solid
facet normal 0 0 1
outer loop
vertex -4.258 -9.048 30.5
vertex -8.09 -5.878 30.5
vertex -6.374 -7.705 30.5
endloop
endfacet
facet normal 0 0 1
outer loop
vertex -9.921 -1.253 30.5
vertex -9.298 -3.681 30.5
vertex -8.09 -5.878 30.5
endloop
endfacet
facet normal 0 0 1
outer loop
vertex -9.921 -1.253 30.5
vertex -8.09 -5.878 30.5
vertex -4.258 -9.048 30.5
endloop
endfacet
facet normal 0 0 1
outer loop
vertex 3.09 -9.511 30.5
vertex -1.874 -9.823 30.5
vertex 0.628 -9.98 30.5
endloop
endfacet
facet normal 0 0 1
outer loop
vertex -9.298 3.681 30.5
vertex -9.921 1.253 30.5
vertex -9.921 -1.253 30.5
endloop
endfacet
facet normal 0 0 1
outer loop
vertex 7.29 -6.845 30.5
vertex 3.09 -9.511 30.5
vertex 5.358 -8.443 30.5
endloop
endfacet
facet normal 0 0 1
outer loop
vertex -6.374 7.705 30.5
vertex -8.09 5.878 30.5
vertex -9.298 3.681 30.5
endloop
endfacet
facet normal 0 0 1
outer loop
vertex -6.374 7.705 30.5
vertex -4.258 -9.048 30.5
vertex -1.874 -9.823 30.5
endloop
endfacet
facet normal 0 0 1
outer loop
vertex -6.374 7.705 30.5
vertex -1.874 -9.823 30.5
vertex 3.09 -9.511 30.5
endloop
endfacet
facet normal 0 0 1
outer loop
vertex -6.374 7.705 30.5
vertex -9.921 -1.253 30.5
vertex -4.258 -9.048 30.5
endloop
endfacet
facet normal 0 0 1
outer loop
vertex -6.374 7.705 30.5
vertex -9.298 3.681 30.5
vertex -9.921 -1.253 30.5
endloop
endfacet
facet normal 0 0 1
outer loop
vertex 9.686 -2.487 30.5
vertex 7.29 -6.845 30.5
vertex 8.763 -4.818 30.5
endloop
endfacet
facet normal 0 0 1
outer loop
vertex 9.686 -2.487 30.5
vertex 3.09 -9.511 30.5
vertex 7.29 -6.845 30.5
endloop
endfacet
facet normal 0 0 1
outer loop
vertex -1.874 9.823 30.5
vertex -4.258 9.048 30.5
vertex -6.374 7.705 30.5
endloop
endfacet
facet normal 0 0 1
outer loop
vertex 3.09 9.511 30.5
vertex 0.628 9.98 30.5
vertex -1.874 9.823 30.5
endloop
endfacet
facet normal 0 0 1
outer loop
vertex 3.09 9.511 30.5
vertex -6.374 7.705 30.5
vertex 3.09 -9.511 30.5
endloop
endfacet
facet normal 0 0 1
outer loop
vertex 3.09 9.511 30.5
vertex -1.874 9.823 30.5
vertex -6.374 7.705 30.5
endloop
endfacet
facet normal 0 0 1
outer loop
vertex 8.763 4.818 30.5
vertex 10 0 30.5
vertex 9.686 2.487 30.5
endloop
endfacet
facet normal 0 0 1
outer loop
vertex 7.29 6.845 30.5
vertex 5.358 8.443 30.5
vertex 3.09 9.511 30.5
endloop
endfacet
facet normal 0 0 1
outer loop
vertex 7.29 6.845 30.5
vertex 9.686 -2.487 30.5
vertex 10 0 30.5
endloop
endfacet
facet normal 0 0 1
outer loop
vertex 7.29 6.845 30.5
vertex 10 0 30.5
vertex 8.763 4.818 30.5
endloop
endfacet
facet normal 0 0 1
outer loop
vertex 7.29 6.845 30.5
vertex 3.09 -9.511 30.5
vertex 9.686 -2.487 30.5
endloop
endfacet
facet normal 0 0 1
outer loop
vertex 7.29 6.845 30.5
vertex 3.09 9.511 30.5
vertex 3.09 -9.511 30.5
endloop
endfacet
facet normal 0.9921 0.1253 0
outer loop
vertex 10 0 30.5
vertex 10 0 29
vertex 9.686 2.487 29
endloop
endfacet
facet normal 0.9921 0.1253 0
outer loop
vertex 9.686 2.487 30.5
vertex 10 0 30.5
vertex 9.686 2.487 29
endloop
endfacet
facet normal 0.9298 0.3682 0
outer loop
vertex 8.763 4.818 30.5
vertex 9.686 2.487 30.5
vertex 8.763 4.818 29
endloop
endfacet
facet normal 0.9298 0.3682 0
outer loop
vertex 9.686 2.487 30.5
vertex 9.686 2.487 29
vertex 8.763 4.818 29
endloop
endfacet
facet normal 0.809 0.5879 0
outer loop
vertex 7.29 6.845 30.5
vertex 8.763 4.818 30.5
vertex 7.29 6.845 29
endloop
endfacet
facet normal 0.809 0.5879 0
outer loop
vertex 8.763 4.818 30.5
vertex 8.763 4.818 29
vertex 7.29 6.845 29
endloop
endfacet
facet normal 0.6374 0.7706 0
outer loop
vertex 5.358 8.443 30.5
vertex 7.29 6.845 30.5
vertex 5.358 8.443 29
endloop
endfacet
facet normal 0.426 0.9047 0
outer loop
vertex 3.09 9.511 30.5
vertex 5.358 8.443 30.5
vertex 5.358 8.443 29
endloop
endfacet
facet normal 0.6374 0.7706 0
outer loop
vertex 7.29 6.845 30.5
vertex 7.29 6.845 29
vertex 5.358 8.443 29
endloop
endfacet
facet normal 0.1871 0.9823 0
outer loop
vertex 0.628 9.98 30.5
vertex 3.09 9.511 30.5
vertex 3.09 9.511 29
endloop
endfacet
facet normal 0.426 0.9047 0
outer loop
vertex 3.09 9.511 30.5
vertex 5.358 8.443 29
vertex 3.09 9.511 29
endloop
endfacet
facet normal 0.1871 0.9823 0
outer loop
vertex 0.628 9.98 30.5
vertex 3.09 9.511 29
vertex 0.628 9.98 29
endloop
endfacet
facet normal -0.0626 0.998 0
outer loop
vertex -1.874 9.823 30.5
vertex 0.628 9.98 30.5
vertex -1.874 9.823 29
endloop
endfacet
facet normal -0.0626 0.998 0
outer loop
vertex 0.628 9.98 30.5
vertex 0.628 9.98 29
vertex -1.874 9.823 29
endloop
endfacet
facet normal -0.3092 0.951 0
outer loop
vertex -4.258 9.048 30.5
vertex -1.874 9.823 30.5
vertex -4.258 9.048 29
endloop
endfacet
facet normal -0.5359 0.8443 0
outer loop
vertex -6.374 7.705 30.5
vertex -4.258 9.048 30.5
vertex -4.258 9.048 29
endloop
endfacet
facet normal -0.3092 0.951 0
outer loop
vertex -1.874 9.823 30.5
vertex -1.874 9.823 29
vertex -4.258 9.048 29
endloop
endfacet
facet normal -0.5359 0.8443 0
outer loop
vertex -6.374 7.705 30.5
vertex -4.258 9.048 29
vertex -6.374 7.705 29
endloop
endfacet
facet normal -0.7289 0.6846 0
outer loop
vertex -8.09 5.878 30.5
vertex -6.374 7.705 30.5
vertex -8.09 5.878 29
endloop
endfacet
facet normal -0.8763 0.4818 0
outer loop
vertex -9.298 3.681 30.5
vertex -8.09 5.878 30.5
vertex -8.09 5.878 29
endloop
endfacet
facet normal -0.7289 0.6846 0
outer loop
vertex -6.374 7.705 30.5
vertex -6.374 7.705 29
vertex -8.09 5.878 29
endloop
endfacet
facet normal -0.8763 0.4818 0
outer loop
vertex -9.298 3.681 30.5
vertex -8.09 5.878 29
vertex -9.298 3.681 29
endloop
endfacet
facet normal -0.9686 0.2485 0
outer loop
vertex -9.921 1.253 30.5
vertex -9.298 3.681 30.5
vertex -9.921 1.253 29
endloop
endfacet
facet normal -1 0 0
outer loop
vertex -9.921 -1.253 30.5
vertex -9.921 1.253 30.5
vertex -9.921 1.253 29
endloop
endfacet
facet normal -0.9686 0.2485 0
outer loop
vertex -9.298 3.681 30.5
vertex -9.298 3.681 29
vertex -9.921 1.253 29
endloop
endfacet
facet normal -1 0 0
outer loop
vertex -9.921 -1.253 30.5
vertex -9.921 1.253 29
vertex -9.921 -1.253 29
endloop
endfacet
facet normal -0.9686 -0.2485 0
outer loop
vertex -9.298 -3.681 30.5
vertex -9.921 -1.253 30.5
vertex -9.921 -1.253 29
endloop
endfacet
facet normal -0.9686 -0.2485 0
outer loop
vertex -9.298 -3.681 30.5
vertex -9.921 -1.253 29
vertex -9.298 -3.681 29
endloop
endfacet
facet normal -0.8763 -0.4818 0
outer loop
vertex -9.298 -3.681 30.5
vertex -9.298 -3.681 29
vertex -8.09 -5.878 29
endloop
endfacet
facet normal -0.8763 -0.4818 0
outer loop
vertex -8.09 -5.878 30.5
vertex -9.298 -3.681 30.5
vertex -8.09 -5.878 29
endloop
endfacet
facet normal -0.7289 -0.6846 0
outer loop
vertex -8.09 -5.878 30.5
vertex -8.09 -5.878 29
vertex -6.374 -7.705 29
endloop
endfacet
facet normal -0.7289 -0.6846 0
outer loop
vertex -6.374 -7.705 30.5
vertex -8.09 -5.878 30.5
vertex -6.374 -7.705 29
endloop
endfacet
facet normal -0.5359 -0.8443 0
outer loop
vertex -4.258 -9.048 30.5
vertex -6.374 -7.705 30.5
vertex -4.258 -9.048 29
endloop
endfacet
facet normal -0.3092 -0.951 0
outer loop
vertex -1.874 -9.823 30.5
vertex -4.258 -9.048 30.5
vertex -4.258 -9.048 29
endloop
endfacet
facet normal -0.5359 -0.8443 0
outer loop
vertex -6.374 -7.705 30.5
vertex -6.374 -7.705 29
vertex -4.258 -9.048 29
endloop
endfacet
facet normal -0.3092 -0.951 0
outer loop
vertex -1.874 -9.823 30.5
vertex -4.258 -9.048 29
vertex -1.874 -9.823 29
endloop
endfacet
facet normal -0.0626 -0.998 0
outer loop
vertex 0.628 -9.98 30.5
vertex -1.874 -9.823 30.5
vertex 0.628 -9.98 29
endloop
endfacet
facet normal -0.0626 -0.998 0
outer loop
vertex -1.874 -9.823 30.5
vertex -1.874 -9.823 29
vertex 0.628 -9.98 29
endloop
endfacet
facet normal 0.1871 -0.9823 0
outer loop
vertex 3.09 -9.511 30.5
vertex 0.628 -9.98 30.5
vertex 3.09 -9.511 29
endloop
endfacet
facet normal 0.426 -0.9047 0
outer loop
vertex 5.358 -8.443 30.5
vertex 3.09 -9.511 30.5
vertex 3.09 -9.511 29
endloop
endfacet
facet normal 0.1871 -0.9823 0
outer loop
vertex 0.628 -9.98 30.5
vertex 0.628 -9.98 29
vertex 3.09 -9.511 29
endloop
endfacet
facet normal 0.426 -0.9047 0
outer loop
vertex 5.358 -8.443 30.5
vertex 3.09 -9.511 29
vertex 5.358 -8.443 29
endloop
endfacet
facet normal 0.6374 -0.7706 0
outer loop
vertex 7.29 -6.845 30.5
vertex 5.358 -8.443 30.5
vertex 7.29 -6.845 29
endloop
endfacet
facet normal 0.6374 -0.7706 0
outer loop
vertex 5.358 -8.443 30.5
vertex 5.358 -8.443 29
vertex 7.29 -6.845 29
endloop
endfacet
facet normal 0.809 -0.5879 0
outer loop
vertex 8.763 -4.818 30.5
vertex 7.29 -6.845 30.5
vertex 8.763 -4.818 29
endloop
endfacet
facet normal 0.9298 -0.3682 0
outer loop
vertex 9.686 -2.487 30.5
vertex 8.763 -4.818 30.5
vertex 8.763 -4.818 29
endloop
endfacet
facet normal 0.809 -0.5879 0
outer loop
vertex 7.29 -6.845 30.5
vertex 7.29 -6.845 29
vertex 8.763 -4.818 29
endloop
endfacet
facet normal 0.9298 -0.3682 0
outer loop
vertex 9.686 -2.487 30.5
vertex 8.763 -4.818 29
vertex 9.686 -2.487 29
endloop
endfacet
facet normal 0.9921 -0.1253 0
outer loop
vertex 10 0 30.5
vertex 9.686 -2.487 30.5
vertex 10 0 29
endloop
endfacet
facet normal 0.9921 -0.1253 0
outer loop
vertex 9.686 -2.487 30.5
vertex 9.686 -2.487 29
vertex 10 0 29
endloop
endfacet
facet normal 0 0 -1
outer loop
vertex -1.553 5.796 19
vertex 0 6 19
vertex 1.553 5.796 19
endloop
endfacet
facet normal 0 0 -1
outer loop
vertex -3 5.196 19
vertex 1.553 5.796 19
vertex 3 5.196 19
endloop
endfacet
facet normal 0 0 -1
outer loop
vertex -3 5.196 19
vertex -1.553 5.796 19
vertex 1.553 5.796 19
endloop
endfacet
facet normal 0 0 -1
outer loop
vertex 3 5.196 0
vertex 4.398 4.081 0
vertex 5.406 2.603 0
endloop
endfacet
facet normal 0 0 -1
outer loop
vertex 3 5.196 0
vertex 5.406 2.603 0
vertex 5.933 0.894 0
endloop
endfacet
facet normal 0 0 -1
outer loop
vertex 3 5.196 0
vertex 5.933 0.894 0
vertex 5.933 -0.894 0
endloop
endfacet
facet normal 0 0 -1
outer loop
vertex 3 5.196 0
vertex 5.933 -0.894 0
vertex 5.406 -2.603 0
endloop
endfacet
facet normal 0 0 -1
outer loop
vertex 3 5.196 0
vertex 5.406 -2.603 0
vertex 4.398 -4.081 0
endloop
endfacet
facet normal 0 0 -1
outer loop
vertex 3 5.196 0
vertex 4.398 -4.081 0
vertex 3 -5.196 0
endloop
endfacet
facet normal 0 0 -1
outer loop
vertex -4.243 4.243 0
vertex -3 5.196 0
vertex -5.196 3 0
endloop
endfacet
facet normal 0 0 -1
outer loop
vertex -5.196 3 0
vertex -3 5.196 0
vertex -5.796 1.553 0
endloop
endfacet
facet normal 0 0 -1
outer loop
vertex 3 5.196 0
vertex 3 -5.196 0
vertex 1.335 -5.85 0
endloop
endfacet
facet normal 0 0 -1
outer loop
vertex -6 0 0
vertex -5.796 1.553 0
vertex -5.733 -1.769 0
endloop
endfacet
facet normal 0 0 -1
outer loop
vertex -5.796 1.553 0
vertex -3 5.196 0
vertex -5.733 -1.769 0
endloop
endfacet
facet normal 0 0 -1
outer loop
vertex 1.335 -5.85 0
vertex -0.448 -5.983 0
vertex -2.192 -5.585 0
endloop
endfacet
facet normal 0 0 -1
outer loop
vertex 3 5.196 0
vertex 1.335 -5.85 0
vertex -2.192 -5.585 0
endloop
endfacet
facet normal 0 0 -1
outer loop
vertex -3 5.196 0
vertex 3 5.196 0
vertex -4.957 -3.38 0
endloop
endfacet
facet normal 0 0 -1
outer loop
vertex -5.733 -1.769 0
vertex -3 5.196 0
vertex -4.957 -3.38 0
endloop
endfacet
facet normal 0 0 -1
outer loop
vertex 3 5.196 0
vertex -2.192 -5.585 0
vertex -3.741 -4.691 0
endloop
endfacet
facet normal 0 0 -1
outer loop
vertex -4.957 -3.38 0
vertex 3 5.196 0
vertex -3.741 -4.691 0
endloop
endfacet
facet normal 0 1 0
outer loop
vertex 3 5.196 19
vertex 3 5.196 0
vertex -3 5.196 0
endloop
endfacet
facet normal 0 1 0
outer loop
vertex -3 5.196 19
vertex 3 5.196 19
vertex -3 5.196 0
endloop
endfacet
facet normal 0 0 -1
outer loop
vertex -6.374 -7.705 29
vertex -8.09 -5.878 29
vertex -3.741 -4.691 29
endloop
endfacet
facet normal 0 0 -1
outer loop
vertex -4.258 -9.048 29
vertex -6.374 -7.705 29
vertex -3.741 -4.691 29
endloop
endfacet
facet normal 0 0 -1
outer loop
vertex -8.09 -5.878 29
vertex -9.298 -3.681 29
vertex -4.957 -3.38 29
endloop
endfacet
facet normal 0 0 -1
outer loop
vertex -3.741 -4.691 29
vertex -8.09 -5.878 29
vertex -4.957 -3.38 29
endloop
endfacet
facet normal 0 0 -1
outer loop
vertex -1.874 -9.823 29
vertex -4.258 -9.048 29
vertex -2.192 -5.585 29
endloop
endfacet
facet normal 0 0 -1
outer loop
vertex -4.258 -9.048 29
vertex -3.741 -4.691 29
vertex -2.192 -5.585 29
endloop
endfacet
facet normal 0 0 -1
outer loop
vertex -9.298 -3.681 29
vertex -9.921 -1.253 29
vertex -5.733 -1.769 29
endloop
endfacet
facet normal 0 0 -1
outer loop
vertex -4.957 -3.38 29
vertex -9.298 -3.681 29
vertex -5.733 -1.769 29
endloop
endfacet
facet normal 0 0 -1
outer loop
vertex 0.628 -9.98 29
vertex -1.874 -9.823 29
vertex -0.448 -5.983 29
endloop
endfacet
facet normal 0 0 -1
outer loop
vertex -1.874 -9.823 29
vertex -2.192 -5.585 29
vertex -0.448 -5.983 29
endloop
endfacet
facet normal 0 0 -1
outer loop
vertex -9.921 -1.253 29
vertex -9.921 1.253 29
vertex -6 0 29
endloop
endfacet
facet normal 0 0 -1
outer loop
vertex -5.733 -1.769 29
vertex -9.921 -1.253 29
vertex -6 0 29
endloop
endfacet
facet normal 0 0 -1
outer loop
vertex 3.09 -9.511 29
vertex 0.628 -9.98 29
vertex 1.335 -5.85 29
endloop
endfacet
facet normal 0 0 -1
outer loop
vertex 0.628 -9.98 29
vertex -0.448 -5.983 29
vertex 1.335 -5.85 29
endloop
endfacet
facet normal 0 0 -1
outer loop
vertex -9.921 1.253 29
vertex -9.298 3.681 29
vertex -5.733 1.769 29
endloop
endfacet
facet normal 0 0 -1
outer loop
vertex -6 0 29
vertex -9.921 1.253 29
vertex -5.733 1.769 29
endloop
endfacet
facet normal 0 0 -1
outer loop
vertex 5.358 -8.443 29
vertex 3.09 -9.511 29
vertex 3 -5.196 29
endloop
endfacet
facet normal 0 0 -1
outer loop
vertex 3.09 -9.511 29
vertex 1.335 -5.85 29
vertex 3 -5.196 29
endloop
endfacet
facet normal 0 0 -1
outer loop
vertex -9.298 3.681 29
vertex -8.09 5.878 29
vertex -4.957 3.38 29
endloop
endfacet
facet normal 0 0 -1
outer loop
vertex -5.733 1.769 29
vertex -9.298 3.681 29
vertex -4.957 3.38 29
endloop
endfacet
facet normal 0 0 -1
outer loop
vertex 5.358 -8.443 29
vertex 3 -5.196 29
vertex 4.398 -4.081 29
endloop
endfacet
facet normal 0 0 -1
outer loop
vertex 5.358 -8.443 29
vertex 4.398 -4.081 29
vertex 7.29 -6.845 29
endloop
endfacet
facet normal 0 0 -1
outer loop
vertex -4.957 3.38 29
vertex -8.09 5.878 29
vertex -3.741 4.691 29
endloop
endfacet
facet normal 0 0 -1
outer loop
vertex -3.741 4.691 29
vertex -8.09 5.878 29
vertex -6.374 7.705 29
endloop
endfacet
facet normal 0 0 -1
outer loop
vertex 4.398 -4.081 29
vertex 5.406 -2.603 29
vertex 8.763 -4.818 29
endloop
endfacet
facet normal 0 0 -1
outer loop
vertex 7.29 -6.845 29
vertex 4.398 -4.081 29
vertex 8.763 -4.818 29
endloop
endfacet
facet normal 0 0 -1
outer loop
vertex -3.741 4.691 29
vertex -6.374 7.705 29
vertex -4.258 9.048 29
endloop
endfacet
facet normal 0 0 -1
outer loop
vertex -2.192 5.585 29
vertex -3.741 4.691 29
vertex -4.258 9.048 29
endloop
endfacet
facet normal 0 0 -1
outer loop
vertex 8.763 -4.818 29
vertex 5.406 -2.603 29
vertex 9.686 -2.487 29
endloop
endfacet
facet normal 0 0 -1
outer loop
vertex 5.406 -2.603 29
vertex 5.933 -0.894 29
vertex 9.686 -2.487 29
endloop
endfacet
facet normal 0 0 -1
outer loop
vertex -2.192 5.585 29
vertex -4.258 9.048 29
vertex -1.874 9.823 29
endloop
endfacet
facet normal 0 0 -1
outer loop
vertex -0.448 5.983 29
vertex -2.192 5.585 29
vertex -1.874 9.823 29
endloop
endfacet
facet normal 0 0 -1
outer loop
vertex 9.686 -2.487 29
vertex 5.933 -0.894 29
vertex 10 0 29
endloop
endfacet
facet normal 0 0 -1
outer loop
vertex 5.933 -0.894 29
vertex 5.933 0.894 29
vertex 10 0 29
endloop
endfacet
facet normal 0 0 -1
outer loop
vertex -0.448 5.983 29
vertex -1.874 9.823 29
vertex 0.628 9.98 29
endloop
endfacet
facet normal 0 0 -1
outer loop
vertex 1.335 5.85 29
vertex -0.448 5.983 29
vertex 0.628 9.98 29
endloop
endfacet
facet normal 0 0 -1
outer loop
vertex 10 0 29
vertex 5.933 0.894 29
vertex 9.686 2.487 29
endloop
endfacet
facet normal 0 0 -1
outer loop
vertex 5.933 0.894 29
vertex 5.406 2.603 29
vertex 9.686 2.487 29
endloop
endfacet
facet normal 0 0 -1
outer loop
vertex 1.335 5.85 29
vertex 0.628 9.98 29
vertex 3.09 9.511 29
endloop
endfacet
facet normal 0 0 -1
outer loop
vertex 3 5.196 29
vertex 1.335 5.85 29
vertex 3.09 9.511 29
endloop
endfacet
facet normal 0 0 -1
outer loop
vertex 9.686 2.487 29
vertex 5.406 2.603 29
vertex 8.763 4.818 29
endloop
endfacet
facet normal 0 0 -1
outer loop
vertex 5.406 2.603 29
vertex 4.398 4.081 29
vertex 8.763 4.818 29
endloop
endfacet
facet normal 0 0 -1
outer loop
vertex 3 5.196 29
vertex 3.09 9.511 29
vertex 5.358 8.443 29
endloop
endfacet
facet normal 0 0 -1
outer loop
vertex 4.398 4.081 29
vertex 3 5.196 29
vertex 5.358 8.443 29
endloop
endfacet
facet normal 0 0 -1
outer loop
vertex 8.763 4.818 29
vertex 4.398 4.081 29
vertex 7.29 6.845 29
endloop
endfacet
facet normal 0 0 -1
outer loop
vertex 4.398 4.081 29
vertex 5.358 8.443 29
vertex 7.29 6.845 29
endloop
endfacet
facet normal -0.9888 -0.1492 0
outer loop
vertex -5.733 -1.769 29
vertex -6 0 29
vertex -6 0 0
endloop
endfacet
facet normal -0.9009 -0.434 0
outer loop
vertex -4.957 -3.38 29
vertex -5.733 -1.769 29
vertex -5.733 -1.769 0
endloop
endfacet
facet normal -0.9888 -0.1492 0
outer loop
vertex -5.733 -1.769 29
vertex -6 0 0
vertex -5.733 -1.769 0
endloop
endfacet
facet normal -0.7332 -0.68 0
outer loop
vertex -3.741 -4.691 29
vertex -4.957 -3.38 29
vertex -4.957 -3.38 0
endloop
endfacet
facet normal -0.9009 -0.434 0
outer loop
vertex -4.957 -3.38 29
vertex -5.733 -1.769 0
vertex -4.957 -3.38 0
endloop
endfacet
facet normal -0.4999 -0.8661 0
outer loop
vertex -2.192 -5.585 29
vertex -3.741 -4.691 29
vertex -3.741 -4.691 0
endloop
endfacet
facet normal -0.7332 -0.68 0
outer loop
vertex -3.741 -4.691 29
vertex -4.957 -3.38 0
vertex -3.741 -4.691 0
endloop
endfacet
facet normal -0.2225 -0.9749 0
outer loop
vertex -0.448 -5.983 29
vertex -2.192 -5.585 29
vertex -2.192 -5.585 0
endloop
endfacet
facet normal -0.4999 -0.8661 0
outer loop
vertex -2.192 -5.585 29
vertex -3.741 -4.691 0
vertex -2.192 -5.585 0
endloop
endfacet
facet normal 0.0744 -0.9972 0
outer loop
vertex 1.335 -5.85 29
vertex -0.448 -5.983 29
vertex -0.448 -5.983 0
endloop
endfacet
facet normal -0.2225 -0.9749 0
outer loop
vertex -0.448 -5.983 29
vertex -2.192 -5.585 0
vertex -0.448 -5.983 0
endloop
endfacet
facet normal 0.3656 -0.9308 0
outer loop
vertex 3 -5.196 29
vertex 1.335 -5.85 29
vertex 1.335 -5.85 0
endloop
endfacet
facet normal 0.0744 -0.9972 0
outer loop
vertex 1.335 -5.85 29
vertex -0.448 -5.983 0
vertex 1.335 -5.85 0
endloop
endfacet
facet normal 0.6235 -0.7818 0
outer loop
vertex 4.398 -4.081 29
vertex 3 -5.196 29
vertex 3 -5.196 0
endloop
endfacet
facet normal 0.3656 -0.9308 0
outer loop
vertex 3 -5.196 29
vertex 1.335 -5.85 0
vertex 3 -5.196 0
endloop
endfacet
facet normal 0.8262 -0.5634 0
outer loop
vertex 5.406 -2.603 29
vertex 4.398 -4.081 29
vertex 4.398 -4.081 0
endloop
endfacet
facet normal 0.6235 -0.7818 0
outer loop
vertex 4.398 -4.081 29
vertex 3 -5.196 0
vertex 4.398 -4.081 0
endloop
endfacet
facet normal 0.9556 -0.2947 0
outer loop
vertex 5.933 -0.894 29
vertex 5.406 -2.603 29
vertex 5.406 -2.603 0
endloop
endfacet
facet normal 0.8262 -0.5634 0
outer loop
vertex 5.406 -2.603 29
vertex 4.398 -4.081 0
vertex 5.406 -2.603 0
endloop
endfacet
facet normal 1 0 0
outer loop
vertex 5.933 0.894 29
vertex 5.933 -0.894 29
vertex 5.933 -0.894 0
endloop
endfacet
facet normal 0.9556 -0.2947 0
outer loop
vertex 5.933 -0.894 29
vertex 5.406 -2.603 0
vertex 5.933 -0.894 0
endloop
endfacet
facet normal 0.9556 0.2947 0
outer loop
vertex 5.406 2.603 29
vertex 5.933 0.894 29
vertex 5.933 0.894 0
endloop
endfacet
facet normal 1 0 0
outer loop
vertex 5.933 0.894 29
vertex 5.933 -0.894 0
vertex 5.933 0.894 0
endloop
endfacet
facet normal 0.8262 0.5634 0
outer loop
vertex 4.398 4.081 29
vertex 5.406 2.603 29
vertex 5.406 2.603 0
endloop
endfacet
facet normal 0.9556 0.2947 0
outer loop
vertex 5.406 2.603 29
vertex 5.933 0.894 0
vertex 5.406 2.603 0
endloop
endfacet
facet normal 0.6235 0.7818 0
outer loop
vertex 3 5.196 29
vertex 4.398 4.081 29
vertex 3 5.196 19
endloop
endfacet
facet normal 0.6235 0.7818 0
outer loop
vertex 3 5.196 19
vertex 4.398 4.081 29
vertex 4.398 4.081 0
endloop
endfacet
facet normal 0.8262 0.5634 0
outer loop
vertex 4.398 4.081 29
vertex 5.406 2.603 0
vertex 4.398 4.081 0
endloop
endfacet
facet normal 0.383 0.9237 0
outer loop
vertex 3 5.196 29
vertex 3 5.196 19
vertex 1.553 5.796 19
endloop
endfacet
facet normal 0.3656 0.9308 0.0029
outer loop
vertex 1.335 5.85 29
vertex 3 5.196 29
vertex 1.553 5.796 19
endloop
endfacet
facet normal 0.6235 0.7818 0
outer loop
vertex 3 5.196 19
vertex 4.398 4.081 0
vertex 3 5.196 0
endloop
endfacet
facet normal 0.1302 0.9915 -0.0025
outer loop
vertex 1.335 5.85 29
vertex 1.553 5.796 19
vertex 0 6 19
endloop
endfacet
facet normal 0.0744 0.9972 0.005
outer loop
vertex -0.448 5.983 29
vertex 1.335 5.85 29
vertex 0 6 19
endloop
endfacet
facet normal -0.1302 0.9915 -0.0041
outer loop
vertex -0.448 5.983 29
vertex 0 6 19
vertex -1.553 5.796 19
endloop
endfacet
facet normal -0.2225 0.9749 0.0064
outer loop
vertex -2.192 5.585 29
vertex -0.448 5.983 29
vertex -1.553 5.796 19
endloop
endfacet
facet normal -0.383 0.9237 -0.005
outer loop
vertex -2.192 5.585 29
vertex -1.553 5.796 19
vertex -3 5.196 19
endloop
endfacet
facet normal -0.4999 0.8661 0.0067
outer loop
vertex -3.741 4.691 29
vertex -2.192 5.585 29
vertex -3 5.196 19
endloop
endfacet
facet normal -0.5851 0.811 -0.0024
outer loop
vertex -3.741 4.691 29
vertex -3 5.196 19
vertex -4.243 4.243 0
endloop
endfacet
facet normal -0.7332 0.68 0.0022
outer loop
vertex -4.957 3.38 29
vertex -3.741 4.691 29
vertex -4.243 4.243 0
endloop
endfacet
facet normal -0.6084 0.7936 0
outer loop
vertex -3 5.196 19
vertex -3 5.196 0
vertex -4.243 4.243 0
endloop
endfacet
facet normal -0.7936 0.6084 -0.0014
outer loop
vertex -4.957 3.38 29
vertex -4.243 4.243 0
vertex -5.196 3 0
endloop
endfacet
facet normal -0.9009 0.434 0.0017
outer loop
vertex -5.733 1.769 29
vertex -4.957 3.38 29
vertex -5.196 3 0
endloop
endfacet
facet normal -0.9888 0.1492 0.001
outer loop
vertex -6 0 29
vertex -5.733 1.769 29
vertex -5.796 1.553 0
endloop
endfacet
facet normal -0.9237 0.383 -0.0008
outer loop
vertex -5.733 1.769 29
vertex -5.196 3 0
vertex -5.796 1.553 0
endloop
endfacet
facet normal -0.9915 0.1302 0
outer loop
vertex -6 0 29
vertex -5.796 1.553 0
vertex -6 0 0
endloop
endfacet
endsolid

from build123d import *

# Parameters (mm, degrees)
SKETCH1_R           = 6
BOSS_EXTRUDE1_DEPTH = 29
CUT_EXTRUDE1_DEPTH  = 19
SKETCH3_R           = 10
BOSS_EXTRUDE2_DEPTH = 1.5


with BuildPart() as part:
    # Sketch1 → Boss-Extrude1 (new body)
    with BuildSketch(Plane.XY):
        with Locations(Location((0, 0, 0), (0, 0, 180))):
            Circle(SKETCH1_R)
    extrude(amount=BOSS_EXTRUDE1_DEPTH)

    # Sketch2 → Cut-Extrude1 (cut)
    with BuildSketch(Plane(origin=(0, 0, 0), x_dir=(-1, 0, 0), z_dir=(0, 0, -1))):
        Polygon((-41.730042052, 5.196152423), (-3, 5.196152423), (3, 5.196152423), (41.730042052, 5.196152423), (41.730042052, 82.656236526), (-41.730042052, 82.656236526), align=None)
    extrude(amount=-CUT_EXTRUDE1_DEPTH, mode=Mode.SUBTRACT)

    # Sketch3 → Boss-Extrude2 (add)
    with BuildSketch(Plane.XY.offset(29)):
        Circle(SKETCH3_R)
    extrude(amount=BOSS_EXTRUDE2_DEPTH)


solid = part.part
